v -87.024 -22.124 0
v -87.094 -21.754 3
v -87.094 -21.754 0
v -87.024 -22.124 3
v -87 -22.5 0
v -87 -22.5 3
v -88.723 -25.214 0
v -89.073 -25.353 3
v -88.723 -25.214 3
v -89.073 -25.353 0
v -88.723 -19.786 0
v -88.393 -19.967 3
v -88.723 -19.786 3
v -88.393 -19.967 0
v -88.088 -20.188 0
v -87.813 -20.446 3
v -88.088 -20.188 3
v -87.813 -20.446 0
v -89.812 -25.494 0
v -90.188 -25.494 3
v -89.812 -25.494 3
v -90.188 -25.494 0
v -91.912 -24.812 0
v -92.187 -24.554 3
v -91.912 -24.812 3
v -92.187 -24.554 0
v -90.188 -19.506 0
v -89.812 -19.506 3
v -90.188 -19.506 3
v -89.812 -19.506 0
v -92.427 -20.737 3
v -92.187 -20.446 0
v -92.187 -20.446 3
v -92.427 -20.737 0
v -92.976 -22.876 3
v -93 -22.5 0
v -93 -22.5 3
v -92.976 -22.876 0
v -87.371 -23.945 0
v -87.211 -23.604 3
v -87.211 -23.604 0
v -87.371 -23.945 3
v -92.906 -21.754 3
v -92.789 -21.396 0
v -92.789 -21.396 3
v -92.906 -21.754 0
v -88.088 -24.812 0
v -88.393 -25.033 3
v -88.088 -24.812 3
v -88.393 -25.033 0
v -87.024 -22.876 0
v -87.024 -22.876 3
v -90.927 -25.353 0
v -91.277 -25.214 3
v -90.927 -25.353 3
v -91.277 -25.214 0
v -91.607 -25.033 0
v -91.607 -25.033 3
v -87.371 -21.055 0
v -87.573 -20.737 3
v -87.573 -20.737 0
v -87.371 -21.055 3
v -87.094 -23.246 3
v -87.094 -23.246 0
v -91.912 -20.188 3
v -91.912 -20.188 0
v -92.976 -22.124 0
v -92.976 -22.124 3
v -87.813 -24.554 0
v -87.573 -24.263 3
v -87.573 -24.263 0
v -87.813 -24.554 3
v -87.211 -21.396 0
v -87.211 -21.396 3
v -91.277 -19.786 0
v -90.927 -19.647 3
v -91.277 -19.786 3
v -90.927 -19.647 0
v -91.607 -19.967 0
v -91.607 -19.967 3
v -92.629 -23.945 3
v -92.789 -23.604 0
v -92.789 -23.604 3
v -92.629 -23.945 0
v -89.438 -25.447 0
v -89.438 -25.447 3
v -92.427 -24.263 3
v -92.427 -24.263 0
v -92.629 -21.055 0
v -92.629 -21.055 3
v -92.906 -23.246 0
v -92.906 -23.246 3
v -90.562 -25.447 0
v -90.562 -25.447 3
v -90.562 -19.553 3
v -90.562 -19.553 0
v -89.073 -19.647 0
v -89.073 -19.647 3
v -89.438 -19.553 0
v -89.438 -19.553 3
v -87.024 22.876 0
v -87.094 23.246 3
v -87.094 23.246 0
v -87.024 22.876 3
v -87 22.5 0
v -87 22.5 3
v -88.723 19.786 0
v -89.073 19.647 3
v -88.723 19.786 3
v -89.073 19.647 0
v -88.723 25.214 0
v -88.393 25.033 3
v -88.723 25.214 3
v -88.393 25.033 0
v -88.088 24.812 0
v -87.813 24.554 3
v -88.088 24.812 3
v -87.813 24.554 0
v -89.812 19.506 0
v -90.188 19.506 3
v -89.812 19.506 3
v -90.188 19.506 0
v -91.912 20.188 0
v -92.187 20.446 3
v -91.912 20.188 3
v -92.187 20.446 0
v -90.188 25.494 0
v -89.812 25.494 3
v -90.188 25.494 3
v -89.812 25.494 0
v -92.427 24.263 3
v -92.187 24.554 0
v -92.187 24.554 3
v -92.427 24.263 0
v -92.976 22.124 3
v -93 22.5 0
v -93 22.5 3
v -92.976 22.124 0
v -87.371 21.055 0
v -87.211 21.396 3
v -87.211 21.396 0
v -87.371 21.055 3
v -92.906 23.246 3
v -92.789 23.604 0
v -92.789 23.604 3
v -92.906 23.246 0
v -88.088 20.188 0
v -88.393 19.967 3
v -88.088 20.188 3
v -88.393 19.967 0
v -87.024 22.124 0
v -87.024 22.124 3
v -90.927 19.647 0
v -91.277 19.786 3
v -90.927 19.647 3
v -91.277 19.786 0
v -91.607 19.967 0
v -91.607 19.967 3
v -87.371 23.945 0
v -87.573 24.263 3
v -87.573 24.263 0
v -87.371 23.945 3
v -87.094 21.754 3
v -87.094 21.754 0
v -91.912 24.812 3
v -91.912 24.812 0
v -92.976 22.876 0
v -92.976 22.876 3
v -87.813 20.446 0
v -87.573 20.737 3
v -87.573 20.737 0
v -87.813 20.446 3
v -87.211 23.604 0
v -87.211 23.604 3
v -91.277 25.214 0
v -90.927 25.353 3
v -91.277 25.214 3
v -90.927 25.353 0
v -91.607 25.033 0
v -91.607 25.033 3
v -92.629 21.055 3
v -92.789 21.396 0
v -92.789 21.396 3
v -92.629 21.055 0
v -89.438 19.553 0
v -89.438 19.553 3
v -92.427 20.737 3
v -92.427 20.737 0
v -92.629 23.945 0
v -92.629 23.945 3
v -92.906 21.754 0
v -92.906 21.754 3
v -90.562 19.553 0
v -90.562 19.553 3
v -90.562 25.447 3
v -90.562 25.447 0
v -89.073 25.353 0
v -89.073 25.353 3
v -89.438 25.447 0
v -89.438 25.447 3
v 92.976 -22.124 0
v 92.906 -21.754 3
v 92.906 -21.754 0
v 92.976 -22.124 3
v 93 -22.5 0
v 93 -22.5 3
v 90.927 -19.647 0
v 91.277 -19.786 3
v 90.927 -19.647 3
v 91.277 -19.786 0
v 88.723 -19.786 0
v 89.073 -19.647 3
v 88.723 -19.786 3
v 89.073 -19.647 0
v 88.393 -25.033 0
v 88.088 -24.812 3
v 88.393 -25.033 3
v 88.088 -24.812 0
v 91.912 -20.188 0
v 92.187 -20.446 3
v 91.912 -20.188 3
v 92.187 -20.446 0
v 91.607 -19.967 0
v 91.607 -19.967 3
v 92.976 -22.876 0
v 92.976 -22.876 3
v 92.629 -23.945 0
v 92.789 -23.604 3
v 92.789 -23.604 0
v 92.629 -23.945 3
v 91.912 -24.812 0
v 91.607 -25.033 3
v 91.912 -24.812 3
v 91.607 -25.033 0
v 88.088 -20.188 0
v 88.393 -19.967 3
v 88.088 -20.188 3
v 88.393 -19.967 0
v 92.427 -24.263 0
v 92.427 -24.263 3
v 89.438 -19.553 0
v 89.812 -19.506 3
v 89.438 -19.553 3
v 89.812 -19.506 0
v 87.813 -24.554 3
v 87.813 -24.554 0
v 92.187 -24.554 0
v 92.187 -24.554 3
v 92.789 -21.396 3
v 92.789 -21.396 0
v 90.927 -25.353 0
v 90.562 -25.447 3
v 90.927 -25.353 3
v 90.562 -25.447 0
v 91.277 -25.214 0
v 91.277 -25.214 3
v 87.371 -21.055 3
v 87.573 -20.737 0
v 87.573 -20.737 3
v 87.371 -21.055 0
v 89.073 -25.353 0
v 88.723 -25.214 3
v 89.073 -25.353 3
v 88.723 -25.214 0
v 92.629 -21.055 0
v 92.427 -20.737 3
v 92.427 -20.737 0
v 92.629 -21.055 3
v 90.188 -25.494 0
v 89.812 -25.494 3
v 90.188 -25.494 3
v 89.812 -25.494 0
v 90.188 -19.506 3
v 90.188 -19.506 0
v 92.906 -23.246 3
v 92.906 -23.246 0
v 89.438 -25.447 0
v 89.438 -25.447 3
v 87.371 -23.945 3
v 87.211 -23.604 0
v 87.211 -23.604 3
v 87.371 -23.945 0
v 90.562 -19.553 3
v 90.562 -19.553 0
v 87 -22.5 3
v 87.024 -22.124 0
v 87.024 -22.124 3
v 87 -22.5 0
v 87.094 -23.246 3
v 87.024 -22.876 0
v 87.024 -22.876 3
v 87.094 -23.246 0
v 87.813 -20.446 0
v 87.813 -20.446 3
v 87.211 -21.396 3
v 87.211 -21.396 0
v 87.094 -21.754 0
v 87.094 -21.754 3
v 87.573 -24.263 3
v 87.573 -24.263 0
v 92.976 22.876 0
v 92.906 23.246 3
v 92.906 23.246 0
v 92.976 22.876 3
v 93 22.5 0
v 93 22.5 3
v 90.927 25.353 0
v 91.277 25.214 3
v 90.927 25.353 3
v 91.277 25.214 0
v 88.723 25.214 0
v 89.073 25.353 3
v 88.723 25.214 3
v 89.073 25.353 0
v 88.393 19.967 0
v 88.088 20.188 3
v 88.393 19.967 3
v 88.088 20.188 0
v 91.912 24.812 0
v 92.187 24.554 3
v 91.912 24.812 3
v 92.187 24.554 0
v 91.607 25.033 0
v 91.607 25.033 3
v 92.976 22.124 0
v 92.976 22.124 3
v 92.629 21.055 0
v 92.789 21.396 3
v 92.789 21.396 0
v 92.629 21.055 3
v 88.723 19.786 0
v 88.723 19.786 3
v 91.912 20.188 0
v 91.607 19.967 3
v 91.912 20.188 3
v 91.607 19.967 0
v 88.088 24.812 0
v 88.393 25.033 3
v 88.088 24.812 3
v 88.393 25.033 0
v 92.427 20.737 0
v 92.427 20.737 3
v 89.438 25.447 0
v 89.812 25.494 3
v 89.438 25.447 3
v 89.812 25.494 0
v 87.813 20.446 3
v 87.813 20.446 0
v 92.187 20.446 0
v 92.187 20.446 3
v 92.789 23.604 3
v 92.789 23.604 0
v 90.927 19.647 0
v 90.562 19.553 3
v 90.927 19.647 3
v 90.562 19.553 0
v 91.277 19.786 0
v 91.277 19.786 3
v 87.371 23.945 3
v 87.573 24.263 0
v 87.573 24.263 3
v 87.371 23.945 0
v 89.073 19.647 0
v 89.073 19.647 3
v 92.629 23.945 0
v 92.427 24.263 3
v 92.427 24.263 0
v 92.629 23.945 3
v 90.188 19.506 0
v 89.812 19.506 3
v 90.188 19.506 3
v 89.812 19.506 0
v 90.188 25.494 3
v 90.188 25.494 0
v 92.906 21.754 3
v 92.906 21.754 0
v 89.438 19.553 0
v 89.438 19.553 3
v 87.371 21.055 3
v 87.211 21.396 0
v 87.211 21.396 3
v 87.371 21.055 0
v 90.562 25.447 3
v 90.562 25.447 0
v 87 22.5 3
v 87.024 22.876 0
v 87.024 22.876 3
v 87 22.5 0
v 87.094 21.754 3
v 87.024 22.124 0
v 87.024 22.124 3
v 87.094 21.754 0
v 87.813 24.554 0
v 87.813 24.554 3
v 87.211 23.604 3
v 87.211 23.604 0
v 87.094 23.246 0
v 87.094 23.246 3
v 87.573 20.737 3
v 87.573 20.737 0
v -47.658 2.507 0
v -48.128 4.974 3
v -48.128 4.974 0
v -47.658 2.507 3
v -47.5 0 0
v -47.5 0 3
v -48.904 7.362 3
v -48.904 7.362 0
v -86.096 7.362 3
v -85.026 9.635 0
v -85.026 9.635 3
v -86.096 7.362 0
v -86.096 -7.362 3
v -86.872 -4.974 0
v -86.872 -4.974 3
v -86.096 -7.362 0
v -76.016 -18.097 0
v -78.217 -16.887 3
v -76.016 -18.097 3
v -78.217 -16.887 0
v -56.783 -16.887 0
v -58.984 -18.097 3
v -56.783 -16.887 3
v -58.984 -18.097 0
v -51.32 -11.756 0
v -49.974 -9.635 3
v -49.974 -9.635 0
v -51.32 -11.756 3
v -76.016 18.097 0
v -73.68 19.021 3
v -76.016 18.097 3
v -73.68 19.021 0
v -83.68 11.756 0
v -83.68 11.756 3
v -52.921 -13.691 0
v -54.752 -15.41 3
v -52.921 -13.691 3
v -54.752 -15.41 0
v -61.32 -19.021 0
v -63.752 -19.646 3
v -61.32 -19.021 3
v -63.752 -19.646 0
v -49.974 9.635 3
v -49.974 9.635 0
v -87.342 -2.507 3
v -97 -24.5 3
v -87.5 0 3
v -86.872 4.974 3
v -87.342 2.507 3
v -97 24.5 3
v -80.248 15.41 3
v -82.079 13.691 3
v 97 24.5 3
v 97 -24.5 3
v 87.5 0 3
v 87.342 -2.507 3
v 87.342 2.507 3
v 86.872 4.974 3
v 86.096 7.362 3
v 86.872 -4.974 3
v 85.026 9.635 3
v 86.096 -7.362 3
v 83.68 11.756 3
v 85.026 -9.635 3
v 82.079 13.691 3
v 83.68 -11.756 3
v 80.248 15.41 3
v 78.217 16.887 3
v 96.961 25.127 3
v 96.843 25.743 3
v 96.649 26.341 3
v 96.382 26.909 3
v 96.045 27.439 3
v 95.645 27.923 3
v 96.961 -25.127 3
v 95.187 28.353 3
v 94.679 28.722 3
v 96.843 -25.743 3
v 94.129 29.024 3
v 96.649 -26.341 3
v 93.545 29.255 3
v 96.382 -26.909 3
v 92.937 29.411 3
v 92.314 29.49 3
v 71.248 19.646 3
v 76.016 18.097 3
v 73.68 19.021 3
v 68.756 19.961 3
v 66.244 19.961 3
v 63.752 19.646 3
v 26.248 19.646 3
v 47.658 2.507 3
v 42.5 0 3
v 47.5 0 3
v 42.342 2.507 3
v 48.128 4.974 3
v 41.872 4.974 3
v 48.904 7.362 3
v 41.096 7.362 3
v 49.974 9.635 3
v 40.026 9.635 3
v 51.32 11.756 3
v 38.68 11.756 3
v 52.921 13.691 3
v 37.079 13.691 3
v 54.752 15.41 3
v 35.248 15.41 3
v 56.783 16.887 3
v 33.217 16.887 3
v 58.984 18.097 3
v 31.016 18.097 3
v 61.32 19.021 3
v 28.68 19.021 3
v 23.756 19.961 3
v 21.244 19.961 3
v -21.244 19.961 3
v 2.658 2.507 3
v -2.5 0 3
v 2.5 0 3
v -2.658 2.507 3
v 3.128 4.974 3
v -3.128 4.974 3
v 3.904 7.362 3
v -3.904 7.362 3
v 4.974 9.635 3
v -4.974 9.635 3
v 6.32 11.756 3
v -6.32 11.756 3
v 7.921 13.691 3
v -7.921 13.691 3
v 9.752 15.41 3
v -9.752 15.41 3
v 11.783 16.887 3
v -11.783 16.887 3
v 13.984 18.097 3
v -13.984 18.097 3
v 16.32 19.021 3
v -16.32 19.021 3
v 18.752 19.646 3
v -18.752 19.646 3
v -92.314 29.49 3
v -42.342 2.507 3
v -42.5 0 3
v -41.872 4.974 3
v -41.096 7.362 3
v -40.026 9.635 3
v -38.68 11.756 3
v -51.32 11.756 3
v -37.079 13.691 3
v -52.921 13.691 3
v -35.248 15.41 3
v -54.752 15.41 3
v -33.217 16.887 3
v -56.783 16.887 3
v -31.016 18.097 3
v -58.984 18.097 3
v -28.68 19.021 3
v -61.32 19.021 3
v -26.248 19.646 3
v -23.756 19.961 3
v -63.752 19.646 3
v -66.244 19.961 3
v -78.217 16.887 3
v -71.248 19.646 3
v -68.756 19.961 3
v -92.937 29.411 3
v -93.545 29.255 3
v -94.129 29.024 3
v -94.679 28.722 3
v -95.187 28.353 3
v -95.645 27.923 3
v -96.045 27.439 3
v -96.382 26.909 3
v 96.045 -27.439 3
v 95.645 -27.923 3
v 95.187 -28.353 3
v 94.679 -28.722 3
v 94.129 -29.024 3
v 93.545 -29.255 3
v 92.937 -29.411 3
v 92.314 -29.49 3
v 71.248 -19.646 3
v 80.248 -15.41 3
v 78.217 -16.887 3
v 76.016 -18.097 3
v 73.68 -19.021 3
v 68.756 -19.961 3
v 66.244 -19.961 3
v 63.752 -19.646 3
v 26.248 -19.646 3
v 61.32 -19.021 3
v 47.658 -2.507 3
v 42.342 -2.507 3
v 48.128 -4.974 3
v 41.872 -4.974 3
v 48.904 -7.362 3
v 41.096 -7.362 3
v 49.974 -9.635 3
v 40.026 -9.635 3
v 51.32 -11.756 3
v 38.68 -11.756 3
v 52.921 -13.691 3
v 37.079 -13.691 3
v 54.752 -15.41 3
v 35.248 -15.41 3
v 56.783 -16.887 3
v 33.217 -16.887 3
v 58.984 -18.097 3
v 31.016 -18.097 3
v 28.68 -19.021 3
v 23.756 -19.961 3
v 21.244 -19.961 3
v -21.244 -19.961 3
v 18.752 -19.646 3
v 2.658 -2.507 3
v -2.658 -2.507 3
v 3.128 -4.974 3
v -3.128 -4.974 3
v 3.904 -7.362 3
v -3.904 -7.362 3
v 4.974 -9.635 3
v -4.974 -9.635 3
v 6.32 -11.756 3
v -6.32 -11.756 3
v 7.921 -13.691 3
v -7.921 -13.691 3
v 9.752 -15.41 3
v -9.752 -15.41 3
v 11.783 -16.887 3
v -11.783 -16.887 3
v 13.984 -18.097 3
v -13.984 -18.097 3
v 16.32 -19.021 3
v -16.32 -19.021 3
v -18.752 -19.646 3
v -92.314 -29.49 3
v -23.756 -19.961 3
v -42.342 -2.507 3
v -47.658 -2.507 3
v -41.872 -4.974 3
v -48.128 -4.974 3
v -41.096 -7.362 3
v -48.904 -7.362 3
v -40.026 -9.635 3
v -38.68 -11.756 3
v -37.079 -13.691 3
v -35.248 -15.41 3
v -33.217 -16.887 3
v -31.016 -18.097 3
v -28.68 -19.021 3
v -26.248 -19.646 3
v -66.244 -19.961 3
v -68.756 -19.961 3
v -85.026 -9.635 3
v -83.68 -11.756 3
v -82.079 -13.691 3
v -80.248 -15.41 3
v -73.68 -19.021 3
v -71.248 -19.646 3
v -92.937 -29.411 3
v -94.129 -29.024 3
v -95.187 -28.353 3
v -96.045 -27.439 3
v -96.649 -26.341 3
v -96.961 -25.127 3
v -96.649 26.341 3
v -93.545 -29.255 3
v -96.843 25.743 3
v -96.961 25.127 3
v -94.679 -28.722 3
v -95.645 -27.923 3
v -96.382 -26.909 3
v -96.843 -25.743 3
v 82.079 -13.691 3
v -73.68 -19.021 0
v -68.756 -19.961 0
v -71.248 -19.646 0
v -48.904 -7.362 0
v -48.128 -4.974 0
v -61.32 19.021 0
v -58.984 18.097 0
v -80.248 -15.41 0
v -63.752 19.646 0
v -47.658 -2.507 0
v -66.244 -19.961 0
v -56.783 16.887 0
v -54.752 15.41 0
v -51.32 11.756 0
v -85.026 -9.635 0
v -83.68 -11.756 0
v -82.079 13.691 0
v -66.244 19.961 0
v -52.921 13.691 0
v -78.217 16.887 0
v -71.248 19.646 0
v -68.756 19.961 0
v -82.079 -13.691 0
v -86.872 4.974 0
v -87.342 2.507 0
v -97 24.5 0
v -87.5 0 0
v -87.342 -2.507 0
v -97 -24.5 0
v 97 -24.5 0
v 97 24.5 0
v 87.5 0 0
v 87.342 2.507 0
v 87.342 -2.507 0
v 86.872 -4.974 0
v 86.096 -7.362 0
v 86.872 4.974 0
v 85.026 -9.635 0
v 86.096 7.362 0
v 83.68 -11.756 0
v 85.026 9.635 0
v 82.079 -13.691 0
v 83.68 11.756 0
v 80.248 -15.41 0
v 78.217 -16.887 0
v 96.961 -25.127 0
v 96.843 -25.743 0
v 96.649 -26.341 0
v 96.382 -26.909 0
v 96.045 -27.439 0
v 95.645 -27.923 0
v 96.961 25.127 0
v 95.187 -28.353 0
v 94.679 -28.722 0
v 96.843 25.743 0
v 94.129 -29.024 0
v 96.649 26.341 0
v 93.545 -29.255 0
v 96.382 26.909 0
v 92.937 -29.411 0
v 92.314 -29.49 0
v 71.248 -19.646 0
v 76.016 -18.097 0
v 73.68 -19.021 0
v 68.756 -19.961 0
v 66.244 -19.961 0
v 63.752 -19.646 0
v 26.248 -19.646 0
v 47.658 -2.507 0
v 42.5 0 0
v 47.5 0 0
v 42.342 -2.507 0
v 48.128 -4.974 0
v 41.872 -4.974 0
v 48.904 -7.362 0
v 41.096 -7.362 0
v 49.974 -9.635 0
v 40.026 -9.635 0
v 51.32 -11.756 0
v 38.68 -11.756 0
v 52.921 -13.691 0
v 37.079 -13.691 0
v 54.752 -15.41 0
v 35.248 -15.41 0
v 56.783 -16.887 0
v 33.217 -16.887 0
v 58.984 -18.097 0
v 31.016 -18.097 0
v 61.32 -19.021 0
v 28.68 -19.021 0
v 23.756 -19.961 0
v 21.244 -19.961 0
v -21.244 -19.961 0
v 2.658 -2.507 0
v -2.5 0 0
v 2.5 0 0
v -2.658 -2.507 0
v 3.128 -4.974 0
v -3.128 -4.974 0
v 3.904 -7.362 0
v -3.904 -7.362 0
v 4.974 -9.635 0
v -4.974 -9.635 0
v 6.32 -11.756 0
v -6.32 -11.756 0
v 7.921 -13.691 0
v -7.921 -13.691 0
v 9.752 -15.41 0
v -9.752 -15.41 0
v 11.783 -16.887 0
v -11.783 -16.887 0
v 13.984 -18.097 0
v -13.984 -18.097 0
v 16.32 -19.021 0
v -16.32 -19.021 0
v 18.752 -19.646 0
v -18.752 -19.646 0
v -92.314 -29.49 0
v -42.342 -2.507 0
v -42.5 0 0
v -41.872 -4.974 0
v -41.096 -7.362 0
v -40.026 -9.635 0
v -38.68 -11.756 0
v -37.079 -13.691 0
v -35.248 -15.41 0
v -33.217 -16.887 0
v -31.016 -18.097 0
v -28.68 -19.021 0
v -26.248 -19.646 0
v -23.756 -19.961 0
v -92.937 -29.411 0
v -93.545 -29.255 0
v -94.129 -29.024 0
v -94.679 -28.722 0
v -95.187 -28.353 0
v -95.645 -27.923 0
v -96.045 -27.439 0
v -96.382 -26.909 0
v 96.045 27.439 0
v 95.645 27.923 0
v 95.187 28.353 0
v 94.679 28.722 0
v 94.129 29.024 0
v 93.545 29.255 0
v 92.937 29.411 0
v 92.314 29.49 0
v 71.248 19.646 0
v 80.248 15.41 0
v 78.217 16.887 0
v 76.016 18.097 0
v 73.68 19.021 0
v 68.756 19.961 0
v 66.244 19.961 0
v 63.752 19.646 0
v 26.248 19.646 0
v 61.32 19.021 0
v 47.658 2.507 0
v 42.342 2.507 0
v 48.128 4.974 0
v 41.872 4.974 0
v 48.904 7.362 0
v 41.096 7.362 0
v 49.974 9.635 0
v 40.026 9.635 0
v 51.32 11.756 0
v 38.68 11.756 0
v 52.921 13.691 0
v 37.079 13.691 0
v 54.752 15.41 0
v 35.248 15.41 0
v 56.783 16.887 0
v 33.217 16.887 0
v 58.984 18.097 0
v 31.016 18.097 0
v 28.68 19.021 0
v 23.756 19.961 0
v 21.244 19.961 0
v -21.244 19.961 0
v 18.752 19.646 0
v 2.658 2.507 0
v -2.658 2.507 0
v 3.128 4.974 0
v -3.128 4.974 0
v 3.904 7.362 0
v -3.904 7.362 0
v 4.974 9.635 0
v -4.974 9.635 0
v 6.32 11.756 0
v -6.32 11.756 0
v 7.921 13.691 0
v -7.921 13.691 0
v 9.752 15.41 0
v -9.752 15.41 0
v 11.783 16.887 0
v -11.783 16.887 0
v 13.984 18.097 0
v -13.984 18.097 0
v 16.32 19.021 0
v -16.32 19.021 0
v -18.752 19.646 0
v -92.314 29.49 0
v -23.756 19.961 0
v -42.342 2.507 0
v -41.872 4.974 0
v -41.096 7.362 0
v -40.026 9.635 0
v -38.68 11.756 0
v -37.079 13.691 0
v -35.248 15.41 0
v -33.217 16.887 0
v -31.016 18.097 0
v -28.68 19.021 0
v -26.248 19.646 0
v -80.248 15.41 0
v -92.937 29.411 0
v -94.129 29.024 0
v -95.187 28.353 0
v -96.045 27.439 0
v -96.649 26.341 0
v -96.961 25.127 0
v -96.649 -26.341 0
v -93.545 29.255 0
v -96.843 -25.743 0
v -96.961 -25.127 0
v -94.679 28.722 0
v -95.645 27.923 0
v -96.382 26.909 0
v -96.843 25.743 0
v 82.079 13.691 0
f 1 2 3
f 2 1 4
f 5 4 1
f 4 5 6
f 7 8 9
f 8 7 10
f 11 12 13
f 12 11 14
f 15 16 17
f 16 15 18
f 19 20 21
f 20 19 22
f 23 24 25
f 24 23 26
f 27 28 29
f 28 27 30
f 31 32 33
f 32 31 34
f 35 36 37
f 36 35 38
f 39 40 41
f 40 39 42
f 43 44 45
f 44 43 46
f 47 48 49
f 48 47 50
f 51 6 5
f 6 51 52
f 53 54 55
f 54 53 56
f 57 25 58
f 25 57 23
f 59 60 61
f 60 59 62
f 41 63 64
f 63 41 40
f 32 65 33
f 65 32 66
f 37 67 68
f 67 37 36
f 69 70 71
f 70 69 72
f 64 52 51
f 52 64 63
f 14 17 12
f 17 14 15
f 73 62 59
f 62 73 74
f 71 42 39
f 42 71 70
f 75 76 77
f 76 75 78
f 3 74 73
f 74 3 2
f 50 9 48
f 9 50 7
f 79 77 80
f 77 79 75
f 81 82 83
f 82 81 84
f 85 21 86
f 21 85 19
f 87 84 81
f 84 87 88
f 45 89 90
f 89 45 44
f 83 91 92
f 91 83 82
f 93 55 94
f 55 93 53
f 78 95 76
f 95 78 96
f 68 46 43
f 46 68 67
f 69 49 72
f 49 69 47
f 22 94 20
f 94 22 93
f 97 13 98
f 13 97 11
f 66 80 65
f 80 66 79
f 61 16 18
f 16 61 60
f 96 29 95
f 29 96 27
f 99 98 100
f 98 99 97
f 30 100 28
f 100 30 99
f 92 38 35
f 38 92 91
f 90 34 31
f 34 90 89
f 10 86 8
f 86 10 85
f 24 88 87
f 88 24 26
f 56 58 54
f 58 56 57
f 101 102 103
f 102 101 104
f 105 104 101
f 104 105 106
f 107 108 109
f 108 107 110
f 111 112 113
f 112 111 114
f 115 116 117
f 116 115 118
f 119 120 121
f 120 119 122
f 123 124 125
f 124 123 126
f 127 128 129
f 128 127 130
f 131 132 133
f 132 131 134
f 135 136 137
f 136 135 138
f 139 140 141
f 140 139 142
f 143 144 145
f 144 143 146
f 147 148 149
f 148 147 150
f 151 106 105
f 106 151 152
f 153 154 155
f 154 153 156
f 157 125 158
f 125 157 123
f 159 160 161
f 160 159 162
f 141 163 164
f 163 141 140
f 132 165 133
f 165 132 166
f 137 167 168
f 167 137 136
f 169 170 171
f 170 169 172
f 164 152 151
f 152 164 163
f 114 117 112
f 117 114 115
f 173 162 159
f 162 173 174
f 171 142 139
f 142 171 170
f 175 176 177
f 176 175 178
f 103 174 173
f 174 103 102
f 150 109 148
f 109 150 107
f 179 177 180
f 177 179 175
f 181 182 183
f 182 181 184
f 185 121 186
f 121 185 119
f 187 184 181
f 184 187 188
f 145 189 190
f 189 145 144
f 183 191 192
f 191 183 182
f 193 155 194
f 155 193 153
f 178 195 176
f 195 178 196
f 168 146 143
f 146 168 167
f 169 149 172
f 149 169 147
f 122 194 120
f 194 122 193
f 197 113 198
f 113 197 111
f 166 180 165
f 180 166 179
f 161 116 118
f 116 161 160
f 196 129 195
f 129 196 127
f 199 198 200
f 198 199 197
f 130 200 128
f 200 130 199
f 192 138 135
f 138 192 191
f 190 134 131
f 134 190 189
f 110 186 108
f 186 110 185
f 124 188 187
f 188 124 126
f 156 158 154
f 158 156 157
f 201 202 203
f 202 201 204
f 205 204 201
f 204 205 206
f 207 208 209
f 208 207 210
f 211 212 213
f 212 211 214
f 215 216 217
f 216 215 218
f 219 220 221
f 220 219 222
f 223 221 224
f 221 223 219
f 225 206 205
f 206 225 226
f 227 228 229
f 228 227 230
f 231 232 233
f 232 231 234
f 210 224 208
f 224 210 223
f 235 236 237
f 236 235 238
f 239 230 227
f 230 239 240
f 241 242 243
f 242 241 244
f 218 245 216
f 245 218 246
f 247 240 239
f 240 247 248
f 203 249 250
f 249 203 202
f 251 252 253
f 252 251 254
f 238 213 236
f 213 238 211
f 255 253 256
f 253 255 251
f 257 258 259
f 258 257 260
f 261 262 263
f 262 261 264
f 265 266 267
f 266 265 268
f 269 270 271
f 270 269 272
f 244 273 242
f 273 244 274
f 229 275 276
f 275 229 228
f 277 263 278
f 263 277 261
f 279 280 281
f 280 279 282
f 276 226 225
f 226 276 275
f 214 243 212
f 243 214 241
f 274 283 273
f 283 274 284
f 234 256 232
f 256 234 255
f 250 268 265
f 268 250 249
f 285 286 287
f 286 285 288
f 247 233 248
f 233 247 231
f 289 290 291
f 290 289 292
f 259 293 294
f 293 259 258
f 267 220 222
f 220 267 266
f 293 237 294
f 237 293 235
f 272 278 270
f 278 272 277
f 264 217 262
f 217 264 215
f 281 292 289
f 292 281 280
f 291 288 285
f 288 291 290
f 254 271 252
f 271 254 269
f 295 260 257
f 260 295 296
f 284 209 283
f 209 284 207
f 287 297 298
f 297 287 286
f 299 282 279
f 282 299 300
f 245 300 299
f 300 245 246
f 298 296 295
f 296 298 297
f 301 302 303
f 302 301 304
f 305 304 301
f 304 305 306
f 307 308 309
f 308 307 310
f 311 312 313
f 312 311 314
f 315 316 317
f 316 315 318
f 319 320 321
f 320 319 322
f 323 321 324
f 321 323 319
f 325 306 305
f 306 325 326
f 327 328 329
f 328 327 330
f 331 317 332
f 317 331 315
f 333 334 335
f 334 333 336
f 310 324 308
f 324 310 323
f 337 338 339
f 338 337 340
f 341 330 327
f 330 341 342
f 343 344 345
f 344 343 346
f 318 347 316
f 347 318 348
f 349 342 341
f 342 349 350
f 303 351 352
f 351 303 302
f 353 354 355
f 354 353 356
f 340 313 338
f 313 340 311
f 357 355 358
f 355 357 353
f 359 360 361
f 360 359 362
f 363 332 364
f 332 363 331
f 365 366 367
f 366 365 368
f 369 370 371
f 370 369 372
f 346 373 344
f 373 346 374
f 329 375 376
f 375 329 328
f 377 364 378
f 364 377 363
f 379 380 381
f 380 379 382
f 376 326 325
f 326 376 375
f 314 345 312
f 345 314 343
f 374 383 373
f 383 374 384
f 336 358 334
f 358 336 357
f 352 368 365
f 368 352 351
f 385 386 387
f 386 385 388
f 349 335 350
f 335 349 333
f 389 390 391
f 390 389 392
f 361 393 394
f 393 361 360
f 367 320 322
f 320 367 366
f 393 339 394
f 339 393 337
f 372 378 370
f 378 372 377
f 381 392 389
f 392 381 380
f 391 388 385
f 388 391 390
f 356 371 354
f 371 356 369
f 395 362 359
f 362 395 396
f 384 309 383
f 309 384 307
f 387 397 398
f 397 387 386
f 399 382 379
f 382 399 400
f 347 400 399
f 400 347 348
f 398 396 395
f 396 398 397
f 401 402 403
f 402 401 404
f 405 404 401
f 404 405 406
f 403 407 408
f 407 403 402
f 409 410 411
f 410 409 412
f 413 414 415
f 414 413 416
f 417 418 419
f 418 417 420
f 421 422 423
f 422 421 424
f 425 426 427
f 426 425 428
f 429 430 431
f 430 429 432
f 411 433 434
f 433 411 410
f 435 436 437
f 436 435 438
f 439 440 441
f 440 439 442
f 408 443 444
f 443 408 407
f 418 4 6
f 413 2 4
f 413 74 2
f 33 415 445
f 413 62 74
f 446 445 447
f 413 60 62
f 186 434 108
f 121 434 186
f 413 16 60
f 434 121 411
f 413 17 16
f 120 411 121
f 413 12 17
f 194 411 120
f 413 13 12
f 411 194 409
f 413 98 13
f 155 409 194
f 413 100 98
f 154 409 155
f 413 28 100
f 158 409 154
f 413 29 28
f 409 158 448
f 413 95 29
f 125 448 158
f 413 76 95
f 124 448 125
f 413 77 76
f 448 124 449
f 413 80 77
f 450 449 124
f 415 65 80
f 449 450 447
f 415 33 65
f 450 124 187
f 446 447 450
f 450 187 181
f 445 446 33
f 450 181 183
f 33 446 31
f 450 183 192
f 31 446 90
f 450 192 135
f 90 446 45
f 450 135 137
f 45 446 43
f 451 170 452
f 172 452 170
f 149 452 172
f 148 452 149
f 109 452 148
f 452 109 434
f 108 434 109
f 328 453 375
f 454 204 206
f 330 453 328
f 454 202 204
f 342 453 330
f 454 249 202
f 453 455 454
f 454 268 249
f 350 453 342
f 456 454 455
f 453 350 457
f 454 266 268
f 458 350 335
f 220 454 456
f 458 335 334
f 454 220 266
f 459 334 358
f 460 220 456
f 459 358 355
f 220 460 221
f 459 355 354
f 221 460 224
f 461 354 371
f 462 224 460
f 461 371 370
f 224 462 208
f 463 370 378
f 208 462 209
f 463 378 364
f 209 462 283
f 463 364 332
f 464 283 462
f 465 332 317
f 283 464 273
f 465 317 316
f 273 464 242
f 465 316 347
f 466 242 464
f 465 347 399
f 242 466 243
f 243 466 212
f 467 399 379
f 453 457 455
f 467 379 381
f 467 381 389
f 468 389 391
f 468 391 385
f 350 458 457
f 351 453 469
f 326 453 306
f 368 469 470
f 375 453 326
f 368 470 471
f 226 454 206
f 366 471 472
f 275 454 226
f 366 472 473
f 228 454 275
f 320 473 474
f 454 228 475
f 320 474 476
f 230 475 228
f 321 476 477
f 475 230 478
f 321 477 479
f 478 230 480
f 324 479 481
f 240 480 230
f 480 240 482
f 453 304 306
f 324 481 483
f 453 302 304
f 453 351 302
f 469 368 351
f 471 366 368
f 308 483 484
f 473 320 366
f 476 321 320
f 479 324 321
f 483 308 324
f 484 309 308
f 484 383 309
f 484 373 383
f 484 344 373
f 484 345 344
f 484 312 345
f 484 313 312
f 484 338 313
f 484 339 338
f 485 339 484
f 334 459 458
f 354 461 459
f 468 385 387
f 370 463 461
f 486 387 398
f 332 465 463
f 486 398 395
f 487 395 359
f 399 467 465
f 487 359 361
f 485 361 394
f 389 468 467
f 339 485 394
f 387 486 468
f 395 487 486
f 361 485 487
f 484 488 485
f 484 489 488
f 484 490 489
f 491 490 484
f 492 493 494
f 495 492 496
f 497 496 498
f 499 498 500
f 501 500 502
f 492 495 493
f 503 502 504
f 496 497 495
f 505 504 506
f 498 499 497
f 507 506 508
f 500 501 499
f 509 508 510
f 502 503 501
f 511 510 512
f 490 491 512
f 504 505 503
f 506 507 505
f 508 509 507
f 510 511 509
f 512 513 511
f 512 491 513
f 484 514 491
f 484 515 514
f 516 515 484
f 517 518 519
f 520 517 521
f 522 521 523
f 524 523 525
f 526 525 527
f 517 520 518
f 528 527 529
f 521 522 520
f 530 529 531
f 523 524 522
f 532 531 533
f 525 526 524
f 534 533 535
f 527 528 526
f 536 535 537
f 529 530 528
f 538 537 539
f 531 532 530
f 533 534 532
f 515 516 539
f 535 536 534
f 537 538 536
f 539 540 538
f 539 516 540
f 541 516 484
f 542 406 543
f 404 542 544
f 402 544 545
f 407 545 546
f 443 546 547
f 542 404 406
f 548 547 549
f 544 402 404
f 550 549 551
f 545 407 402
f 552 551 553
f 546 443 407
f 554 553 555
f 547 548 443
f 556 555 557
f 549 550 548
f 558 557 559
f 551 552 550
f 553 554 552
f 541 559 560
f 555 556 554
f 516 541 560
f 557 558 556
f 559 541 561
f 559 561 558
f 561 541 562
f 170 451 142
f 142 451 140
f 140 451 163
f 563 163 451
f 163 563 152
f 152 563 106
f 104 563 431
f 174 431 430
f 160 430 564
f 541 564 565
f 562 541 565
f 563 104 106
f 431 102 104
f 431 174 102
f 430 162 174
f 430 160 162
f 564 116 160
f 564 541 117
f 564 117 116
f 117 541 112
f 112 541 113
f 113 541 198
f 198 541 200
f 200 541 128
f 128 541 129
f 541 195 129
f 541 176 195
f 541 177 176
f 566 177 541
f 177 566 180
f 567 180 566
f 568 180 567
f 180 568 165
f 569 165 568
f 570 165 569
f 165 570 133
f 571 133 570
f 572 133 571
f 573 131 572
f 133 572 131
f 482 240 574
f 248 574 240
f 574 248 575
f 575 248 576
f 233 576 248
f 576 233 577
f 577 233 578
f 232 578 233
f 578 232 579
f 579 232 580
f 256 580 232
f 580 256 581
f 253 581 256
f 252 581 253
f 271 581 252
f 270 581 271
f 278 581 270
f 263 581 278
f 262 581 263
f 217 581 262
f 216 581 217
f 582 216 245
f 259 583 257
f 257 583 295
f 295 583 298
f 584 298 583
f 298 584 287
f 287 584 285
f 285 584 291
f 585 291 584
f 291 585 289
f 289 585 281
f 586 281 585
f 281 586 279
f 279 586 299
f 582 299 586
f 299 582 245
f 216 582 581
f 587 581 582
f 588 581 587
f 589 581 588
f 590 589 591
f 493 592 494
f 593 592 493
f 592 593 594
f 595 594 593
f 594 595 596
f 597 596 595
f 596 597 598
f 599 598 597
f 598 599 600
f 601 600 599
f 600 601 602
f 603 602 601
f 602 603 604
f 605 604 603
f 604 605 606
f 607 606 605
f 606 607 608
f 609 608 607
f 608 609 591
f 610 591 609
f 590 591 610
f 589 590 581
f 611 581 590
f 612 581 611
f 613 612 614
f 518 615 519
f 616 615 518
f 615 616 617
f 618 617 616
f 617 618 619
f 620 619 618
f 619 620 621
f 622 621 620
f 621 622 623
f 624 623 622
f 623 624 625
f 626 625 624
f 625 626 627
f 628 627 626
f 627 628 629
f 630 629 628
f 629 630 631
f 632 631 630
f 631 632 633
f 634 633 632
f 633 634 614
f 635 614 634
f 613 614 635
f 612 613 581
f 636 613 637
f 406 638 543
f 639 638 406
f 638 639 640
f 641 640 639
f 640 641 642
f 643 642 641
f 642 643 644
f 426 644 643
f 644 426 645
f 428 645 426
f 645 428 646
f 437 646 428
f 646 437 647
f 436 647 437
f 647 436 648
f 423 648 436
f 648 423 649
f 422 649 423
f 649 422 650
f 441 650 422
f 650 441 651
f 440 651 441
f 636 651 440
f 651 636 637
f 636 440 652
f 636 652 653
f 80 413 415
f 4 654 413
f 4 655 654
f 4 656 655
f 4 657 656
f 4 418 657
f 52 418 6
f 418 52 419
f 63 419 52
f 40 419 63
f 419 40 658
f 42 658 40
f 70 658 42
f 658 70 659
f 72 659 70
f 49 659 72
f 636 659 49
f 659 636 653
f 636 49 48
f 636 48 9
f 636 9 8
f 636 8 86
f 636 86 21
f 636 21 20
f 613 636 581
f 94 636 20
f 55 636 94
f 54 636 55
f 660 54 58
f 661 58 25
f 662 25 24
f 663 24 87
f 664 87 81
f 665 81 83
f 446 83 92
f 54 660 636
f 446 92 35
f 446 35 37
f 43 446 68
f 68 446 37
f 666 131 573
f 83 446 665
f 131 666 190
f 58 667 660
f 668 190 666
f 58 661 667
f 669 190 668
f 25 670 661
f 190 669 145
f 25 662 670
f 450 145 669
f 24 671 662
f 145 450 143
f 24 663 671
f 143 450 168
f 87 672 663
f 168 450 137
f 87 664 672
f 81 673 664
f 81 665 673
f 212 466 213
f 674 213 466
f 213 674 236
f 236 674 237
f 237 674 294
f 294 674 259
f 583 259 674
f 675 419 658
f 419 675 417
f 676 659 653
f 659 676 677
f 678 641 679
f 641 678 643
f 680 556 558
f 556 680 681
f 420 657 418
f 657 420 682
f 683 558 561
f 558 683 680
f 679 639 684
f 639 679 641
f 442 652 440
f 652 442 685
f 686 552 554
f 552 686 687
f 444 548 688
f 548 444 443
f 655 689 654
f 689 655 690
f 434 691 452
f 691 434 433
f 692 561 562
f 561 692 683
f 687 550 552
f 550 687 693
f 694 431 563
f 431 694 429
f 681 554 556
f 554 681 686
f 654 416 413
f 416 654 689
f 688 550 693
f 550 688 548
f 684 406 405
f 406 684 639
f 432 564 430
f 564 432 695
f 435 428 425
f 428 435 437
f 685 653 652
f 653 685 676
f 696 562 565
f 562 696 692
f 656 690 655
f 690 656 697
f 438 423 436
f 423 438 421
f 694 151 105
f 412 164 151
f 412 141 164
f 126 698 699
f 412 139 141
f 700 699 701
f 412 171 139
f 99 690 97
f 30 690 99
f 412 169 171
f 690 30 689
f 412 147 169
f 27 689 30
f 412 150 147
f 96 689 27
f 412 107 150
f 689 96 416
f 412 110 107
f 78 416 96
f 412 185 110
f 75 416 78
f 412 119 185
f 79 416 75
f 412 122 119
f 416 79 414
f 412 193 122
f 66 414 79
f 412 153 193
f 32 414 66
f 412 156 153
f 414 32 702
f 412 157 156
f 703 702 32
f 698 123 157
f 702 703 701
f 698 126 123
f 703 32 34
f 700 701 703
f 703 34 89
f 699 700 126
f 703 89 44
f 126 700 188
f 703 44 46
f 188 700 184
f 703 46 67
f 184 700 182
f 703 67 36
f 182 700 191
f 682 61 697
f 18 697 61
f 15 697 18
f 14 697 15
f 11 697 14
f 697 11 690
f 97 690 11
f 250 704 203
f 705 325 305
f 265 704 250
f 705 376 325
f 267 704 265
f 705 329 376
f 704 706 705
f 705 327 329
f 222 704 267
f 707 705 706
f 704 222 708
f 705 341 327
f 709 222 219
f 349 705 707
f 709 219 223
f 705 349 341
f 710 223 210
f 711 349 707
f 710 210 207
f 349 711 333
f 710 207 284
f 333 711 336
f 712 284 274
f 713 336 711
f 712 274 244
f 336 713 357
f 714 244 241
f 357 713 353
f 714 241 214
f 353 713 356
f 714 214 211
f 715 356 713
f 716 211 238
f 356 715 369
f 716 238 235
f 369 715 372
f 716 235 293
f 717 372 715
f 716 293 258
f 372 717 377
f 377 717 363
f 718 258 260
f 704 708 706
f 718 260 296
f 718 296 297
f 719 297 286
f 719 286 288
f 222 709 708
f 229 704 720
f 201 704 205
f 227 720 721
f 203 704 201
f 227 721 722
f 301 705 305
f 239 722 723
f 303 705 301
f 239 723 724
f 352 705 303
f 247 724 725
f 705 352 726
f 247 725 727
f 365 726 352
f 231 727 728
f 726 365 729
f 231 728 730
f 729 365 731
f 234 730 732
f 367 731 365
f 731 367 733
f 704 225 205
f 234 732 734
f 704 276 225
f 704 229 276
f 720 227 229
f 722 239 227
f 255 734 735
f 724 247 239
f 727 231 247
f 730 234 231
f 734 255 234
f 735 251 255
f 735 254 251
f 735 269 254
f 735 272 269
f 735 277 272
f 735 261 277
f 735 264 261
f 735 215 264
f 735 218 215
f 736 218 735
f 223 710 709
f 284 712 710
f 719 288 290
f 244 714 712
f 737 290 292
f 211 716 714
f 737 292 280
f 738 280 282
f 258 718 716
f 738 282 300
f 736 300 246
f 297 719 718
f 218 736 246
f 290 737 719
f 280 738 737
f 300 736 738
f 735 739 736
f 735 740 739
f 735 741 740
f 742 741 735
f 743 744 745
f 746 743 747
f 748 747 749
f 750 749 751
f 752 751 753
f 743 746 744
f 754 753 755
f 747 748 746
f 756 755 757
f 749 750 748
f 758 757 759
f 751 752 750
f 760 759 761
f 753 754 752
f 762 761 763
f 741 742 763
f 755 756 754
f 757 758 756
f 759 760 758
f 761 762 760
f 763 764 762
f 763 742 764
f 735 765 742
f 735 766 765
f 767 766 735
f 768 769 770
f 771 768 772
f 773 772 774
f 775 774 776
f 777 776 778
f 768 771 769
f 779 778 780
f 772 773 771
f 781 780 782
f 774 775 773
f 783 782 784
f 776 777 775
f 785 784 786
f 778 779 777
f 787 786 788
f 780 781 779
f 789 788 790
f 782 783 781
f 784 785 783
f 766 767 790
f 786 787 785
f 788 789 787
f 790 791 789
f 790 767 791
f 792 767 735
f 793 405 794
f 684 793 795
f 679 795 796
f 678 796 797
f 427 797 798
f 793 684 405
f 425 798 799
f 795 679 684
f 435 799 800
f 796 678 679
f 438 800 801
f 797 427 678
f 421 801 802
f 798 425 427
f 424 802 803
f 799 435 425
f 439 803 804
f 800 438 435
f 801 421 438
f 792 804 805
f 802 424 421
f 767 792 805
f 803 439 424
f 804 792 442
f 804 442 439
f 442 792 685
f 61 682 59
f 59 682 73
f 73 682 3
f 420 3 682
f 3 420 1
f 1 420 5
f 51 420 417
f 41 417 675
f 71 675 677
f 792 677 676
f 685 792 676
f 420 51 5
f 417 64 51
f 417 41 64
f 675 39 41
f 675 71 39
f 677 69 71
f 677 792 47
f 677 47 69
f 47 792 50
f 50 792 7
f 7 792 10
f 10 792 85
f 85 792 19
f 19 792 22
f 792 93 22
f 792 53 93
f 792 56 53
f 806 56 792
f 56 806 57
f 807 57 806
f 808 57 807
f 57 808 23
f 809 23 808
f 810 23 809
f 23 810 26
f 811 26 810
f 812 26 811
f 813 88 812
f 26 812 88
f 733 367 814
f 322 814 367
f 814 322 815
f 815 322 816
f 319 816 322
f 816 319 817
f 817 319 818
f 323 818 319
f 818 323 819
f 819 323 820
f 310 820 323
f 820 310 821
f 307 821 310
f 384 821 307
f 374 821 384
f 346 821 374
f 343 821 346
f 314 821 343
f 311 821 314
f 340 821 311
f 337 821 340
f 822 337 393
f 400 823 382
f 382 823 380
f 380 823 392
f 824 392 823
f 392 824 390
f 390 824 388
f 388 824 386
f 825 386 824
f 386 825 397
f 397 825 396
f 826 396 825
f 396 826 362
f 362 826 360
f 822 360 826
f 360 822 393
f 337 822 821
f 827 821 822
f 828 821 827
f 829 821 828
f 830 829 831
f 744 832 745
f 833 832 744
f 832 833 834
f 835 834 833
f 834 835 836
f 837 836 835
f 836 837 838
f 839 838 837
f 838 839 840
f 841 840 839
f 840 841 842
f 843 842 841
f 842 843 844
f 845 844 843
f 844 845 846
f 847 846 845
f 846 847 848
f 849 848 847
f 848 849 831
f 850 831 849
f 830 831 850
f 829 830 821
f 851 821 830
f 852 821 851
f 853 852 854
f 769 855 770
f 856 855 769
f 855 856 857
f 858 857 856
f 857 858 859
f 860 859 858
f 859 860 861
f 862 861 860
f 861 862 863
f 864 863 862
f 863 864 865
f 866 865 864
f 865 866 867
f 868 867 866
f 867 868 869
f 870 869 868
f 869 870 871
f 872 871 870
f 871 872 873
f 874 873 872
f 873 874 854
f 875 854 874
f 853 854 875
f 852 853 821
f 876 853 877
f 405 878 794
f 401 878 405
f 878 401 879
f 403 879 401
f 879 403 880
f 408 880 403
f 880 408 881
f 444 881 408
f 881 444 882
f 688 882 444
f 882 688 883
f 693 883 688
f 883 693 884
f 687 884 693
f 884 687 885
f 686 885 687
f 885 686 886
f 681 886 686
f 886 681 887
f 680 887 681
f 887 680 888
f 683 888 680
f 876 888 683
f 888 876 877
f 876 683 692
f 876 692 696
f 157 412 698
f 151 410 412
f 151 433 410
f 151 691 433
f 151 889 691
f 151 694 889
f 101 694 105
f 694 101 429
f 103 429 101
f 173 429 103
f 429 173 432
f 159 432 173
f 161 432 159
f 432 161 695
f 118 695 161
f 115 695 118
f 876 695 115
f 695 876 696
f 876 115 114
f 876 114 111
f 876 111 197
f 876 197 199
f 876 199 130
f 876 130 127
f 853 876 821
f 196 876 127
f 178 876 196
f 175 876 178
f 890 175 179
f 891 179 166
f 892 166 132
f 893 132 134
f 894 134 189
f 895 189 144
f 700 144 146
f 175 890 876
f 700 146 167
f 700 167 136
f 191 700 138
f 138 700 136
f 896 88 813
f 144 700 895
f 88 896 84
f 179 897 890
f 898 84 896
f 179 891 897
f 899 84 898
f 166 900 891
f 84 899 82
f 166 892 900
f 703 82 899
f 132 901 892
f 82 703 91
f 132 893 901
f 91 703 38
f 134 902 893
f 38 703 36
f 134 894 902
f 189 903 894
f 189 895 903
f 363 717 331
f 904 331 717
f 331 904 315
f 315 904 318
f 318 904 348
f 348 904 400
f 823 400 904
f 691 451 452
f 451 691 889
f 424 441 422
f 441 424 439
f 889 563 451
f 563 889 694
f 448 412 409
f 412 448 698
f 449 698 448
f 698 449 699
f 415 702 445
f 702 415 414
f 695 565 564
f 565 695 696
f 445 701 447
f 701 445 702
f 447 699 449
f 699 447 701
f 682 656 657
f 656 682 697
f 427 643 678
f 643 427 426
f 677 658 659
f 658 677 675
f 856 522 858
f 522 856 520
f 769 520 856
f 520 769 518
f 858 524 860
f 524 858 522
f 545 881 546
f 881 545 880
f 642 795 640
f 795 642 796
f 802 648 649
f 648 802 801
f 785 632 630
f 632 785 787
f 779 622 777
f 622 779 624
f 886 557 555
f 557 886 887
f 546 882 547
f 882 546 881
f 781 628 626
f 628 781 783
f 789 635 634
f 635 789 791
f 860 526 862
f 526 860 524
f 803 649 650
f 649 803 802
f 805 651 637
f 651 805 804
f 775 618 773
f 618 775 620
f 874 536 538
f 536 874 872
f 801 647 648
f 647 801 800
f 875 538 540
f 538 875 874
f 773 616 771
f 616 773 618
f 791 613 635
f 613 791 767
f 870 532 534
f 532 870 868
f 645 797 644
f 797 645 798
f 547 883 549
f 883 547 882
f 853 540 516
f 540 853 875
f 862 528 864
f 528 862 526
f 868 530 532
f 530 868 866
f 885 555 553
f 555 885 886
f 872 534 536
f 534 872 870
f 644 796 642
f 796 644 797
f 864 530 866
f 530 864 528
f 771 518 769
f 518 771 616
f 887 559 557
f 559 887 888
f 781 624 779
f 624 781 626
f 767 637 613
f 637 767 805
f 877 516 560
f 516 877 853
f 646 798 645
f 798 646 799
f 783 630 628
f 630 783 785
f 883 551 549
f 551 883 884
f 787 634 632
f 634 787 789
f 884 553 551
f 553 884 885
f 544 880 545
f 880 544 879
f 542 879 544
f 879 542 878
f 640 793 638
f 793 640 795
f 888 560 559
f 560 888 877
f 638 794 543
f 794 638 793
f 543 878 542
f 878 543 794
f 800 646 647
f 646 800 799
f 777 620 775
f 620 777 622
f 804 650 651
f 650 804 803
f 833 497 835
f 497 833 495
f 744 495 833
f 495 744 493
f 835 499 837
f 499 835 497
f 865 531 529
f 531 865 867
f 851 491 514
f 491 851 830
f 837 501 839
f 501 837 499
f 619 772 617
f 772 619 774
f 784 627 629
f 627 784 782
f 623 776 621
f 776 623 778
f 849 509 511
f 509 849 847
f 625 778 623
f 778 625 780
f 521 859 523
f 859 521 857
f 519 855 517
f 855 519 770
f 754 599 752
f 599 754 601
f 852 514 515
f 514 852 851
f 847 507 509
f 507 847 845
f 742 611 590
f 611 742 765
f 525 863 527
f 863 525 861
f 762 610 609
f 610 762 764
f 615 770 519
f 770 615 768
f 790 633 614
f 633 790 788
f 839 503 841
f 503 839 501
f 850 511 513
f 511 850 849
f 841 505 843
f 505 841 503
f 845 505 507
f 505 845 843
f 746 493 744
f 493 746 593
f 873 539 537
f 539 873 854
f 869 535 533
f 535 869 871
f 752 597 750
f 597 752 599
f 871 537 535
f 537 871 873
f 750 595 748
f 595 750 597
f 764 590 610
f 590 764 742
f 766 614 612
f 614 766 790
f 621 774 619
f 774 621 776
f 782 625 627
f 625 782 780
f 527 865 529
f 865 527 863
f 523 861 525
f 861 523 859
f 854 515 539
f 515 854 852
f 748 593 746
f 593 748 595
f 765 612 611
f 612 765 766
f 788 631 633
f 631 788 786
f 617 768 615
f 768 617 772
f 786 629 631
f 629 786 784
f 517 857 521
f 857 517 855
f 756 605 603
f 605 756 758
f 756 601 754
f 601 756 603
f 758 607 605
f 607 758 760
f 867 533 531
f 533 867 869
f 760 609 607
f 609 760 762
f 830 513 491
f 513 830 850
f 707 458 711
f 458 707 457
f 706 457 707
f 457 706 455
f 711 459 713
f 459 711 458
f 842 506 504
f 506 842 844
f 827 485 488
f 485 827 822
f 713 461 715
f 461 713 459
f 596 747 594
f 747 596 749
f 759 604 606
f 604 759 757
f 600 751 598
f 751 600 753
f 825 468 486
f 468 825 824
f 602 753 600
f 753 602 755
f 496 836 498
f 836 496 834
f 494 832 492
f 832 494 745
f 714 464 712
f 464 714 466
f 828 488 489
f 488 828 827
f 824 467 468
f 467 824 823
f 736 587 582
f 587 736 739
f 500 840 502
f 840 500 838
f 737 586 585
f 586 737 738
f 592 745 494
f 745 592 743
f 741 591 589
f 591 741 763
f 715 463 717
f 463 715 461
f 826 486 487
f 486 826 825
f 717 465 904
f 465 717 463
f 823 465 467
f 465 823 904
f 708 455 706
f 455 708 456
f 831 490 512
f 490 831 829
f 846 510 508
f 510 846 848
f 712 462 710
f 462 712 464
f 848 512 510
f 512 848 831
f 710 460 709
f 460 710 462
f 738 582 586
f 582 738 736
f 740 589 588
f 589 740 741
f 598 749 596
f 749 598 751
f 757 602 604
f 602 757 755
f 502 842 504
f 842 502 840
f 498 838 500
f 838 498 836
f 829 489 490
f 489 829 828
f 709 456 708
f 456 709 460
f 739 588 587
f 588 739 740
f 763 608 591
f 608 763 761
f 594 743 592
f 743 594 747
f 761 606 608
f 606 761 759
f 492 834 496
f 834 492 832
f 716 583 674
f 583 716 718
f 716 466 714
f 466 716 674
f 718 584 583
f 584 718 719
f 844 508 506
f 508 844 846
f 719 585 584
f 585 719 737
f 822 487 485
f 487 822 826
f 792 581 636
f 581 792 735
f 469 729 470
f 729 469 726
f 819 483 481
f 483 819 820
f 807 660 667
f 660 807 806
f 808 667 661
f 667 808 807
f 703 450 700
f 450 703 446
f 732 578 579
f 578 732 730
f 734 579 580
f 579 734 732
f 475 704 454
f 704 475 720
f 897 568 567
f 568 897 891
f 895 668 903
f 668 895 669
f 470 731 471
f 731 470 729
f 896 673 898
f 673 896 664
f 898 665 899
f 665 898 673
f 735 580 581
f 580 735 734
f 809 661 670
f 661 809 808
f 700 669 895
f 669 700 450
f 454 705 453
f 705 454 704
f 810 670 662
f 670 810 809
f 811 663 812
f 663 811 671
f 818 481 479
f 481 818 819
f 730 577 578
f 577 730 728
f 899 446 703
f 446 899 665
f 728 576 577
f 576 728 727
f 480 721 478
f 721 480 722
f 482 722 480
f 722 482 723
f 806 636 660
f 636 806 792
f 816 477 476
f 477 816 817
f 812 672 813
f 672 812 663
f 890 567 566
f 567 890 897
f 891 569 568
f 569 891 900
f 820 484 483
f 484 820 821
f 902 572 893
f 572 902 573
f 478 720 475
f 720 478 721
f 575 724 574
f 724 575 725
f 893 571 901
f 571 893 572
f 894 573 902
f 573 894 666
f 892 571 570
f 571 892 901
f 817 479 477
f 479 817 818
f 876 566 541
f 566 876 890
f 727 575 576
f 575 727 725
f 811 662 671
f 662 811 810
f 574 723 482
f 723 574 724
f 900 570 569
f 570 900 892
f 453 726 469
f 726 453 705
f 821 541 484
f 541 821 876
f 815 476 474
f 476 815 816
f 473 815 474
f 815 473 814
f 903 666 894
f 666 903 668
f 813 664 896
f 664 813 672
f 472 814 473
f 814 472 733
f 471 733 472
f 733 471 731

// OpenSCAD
$fn = 50;


difference() {
	union() {
		hull() {
			translate(v = [-92.0000000000, 24.5000000000, 0]) {
				cylinder(h = 3, r = 5);
			}
			translate(v = [92.0000000000, 24.5000000000, 0]) {
				cylinder(h = 3, r = 5);
			}
			translate(v = [-92.0000000000, -24.5000000000, 0]) {
				cylinder(h = 3, r = 5);
			}
			translate(v = [92.0000000000, -24.5000000000, 0]) {
				cylinder(h = 3, r = 5);
			}
		}
	}
	union() {
		#translate(v = [-90.0000000000, -22.5000000000, -100.0000000000]) {
			cylinder(h = 200, r = 3.0000000000);
		}
		#translate(v = [-90.0000000000, 22.5000000000, -100.0000000000]) {
			cylinder(h = 200, r = 3.0000000000);
		}
		#translate(v = [90.0000000000, -22.5000000000, -100.0000000000]) {
			cylinder(h = 200, r = 3.0000000000);
		}
		#translate(v = [90.0000000000, 22.5000000000, -100.0000000000]) {
			cylinder(h = 200, r = 3.0000000000);
		}
		#translate(v = [-67.5000000000, 0, 0]) {
			cylinder(h = 3, r = 20.0000000000);
		}
		#translate(v = [-22.5000000000, 0, 0]) {
			cylinder(h = 3, r = 20.0000000000);
		}
		#translate(v = [22.5000000000, 0, 0]) {
			cylinder(h = 3, r = 20.0000000000);
		}
		#translate(v = [67.5000000000, 0, 0]) {
			cylinder(h = 3, r = 20.0000000000);
		}
	}
}
